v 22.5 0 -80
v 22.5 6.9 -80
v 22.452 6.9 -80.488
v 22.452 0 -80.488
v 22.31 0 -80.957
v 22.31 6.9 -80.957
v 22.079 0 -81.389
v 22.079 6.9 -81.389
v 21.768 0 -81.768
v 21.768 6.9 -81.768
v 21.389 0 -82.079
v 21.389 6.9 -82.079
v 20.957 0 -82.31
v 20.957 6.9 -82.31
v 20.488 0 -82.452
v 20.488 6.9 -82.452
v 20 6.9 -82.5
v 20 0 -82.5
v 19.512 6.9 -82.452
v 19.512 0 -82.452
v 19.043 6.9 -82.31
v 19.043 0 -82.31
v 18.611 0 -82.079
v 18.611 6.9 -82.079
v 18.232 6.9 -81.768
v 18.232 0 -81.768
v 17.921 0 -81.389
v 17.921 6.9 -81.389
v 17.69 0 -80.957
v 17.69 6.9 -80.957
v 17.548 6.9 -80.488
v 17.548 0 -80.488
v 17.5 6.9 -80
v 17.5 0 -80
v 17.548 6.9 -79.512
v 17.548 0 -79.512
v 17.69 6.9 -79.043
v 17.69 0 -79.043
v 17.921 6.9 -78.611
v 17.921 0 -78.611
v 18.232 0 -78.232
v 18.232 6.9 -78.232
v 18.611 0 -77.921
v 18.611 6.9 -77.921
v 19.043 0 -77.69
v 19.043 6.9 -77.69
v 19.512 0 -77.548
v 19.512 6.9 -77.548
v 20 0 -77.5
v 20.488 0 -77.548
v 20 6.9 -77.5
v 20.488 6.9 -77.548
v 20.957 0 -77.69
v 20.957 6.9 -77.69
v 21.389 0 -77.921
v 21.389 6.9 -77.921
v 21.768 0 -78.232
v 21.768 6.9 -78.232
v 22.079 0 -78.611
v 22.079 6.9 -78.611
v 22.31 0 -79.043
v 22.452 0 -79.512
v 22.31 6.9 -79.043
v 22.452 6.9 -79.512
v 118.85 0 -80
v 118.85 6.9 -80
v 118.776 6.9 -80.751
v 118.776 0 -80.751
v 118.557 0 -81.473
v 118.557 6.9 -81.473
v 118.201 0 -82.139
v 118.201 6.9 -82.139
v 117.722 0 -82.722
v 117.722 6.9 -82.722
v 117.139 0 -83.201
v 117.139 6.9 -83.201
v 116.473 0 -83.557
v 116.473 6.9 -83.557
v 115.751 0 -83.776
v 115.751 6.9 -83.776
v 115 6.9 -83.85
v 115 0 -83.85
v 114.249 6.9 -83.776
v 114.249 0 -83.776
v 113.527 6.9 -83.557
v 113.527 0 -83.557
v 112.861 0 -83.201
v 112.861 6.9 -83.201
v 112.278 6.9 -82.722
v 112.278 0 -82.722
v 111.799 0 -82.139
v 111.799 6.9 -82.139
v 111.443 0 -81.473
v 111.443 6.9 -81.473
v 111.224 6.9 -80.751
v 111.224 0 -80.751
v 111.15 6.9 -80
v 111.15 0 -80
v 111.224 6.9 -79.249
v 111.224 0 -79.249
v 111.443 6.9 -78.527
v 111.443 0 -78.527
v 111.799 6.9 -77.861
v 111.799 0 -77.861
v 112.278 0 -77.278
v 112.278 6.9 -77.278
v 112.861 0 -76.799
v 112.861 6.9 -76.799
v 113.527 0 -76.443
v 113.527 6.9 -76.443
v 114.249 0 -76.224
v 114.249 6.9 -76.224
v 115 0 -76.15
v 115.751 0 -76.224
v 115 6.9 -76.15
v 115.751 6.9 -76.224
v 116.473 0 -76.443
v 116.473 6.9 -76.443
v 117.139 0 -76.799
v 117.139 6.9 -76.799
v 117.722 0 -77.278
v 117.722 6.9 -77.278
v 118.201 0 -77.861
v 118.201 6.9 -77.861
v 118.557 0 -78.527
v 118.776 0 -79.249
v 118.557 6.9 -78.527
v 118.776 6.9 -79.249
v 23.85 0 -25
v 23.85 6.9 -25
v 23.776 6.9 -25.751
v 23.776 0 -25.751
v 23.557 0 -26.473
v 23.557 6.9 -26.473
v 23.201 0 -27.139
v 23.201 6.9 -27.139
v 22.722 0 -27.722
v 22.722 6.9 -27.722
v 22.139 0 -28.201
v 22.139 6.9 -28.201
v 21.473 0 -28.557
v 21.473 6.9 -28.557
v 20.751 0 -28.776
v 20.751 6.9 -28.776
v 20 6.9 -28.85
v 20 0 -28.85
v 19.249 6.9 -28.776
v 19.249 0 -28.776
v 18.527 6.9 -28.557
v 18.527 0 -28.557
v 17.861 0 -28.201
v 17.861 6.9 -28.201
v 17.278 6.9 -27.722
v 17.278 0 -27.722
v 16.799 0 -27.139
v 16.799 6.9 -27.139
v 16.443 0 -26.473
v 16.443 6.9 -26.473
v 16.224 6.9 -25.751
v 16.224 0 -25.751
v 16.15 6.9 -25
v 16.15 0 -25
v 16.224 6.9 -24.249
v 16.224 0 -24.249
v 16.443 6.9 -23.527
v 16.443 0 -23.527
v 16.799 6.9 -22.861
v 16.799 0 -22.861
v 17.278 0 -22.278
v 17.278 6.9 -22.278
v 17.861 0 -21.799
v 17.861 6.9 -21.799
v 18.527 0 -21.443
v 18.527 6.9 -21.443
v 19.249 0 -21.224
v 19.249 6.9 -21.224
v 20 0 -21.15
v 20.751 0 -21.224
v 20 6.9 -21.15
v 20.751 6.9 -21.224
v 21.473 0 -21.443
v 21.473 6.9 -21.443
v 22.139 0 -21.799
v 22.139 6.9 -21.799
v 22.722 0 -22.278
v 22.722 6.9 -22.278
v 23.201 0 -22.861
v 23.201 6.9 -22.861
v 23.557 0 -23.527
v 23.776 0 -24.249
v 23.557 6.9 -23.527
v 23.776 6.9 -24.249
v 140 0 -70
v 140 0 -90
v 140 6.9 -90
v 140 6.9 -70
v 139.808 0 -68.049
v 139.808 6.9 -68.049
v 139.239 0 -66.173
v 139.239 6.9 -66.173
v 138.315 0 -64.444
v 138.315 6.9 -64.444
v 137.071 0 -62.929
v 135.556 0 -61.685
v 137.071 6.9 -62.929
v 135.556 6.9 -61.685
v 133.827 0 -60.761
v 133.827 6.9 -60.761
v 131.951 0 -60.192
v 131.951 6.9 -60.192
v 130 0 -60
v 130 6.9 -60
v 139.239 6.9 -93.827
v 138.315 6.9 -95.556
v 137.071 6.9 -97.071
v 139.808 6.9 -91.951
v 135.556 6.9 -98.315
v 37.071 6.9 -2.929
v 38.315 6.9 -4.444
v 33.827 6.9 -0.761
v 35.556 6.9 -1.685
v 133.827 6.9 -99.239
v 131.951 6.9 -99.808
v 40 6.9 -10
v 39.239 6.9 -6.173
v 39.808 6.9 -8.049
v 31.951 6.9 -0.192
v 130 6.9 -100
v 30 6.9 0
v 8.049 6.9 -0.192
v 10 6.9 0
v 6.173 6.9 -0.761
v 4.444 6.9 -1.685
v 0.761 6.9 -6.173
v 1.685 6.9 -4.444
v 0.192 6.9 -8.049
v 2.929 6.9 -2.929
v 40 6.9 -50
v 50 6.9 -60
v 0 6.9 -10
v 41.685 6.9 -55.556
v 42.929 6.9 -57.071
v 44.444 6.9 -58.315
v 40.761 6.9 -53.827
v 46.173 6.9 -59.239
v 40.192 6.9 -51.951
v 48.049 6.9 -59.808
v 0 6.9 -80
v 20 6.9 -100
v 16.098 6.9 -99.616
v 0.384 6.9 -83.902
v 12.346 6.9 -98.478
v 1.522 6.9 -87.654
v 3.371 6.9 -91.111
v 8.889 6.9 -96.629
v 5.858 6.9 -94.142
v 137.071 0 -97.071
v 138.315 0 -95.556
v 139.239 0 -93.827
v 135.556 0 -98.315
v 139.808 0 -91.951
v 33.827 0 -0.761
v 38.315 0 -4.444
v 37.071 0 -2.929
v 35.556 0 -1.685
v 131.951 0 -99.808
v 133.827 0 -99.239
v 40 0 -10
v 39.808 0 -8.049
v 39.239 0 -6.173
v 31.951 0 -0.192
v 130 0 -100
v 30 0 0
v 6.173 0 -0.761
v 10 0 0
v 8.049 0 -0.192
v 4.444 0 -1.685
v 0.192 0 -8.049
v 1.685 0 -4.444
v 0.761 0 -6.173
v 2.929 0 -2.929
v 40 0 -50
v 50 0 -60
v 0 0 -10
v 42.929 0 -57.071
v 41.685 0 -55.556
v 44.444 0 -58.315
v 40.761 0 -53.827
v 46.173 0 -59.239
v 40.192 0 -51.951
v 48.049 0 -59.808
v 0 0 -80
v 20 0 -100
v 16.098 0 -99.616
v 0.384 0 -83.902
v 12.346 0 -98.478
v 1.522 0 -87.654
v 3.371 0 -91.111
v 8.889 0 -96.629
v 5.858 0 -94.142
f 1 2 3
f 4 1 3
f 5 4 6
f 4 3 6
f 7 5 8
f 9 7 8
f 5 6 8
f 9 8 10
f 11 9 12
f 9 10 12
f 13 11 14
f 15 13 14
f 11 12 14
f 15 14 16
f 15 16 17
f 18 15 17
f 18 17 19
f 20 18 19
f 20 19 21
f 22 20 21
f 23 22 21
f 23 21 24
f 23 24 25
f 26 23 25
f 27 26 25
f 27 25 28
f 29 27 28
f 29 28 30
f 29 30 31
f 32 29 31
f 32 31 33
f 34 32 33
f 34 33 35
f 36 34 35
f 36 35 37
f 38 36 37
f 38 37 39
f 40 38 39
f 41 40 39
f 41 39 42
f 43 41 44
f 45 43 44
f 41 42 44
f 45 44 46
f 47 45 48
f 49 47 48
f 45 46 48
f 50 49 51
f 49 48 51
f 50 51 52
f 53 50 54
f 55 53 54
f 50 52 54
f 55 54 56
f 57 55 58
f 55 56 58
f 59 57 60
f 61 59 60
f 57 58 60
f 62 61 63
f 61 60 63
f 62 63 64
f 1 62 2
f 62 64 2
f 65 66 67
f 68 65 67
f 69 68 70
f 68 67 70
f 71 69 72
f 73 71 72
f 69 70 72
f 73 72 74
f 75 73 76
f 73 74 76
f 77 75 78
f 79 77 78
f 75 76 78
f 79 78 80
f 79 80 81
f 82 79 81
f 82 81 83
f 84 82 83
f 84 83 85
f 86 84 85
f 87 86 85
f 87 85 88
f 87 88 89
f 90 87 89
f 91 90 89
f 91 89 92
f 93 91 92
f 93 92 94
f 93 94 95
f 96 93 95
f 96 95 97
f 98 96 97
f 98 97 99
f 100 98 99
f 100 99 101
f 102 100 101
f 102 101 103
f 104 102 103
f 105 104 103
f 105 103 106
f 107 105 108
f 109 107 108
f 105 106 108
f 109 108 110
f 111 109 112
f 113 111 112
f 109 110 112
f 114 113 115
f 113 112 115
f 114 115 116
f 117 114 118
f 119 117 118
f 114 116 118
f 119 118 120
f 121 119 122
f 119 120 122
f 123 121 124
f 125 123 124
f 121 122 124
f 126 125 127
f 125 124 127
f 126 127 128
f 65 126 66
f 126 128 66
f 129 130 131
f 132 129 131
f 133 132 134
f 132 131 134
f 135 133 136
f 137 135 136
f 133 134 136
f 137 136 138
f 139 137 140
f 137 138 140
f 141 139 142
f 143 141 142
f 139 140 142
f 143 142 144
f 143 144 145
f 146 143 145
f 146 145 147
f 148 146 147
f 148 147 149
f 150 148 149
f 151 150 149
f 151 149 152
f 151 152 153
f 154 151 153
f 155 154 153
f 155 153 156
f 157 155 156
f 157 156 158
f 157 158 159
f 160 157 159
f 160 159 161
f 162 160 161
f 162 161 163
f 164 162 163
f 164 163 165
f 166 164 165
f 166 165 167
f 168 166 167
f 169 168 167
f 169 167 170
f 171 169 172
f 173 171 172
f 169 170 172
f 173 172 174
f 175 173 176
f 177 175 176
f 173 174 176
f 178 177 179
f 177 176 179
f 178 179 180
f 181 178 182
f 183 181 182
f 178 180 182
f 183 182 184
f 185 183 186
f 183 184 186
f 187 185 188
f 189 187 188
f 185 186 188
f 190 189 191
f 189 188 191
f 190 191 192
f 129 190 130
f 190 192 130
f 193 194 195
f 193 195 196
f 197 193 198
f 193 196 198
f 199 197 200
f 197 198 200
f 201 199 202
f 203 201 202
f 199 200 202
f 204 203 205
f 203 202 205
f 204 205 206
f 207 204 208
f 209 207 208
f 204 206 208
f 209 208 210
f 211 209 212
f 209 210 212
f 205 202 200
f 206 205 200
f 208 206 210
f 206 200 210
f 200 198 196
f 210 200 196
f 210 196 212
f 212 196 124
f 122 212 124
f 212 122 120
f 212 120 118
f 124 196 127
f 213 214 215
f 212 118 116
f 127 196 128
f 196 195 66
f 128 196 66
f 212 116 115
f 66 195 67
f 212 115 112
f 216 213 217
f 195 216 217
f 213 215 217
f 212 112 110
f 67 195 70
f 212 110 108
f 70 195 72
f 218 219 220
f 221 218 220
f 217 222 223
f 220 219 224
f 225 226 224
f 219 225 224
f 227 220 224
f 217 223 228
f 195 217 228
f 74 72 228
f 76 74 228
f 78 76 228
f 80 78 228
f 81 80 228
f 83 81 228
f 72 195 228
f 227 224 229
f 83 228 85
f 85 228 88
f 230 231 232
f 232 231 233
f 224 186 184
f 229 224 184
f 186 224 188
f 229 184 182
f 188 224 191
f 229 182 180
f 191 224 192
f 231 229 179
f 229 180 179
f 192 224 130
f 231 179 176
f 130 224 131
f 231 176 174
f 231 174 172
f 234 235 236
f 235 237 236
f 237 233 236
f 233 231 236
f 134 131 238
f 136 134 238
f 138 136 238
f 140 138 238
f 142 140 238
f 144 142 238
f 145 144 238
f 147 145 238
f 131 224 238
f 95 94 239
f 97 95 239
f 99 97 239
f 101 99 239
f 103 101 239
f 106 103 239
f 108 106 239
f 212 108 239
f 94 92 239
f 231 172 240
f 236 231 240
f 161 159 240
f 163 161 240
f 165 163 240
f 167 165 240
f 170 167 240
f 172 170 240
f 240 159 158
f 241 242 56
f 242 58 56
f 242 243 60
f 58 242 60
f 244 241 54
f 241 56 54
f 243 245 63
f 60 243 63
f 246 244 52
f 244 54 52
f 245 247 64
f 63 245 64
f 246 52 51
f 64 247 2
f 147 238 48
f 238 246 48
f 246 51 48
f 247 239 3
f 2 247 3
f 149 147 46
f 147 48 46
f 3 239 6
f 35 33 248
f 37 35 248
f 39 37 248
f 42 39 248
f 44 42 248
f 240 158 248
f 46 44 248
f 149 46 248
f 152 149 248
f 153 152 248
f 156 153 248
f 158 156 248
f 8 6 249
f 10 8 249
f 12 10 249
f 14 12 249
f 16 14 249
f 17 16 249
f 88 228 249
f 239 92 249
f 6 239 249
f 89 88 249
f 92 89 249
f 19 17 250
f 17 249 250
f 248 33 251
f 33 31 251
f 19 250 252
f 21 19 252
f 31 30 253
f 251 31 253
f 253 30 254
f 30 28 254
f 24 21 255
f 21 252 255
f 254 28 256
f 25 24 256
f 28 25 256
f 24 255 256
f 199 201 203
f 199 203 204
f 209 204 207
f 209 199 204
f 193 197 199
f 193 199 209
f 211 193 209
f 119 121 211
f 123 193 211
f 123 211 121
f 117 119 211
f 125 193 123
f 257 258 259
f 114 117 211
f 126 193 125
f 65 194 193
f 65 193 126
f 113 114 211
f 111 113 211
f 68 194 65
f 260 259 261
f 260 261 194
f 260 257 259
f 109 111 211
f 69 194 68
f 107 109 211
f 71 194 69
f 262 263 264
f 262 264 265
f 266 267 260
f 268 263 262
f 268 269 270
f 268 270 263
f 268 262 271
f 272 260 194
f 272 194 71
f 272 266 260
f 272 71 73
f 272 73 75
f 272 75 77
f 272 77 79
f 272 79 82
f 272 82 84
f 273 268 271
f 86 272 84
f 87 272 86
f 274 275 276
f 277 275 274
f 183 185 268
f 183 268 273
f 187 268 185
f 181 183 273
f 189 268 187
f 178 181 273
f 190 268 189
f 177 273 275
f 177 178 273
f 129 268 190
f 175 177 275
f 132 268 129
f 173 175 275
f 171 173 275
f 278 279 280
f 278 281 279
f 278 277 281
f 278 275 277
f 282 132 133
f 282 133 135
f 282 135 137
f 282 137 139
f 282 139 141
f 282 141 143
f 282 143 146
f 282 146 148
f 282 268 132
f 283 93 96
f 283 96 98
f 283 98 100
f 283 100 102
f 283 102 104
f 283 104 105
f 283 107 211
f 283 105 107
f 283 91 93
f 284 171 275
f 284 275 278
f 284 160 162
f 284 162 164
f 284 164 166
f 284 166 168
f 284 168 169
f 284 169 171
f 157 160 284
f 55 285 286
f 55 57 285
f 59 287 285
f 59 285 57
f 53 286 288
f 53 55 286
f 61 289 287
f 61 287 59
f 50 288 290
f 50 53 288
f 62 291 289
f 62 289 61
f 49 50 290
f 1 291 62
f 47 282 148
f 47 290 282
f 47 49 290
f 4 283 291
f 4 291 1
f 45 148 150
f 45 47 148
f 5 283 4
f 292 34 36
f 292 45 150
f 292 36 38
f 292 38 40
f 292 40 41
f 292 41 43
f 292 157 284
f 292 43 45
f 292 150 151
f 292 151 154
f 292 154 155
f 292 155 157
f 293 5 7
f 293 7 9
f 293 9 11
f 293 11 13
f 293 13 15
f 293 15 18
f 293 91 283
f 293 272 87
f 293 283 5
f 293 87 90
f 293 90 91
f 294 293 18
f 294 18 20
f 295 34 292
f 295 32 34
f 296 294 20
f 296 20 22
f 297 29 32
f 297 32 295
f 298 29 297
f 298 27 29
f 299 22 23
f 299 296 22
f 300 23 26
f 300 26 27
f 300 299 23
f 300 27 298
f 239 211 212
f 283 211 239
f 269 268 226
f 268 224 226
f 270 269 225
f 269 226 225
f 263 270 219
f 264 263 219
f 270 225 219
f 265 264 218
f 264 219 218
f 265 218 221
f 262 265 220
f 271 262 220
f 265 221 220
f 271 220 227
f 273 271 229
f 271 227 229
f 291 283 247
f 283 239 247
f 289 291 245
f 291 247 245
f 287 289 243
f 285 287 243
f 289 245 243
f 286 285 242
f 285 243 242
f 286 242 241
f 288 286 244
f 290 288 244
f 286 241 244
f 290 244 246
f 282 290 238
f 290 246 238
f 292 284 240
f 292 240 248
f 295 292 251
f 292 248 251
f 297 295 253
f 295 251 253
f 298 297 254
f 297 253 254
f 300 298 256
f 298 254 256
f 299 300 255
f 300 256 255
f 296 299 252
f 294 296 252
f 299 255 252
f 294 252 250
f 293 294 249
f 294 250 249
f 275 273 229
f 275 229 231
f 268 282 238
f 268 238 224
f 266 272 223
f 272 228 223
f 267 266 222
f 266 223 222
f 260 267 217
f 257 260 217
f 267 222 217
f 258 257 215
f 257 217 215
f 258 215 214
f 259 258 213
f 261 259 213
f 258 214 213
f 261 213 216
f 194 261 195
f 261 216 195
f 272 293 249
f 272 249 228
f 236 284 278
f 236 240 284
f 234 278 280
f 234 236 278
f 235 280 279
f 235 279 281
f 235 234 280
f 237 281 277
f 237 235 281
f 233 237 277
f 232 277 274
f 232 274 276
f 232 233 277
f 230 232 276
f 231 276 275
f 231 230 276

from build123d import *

# Parameters (mm, degrees)
BOSS_EXTRUDE1_DEPTH = 6.9
FILLET1_R           = 10
FILLET2_R           = 20
SKETCH3_R           = 2.5
CUT_EXTRUDE2_DEPTH  = 7.9
SKETCH2_R           = 3.85
CUT_EXTRUDE1_DEPTH  = 7.9


with BuildPart() as part:
    # Sketch1 → Boss-Extrude1 (new body)
    with BuildSketch(Plane(origin=(0, 0, 0), x_dir=(1, 0, 0), z_dir=(0, 1, 0))):
        Polygon((0, 0), (0, 100), (140, 100), (140, 60), (40, 60), (40, 0), align=None)
    extrude(amount=BOSS_EXTRUDE1_DEPTH)

    # Fillet1
    fillet1_edges = [part.edges().sort_by_distance(p)[0] for p in [
        (0, 3.45, 0),
        (140, 3.45, -100),
        (140, 3.45, -60),
        (40, 3.45, -60),
        (40, 3.45, 0),
    ]]
    fillet(fillet1_edges, radius=FILLET1_R)

    # Fillet2
    fillet2_edges = [part.edges().sort_by_distance(p)[0] for p in [
        (0, 3.45, -100),
    ]]
    fillet(fillet2_edges, radius=FILLET2_R)

    # Sketch3 → Cut-Extrude2 (cut, through all)
    with BuildSketch(Plane(origin=(0, 6.9, 0), x_dir=(1, 0, 0), z_dir=(0, 1, 0))):
        with Locations((20, 80)):
            Circle(SKETCH3_R)
    extrude(amount=-CUT_EXTRUDE2_DEPTH, mode=Mode.SUBTRACT)

    # Sketch2 → Cut-Extrude1 (cut, through all)
    with BuildSketch(Plane(origin=(0, 6.9, 0), x_dir=(1, 0, 0), z_dir=(0, 1, 0))):
        with Locations((20, 25)):
            Circle(SKETCH2_R)
        with Locations((115, 80)):
            Circle(SKETCH2_R)
    extrude(amount=-CUT_EXTRUDE1_DEPTH, mode=Mode.SUBTRACT)


solid = part.part
